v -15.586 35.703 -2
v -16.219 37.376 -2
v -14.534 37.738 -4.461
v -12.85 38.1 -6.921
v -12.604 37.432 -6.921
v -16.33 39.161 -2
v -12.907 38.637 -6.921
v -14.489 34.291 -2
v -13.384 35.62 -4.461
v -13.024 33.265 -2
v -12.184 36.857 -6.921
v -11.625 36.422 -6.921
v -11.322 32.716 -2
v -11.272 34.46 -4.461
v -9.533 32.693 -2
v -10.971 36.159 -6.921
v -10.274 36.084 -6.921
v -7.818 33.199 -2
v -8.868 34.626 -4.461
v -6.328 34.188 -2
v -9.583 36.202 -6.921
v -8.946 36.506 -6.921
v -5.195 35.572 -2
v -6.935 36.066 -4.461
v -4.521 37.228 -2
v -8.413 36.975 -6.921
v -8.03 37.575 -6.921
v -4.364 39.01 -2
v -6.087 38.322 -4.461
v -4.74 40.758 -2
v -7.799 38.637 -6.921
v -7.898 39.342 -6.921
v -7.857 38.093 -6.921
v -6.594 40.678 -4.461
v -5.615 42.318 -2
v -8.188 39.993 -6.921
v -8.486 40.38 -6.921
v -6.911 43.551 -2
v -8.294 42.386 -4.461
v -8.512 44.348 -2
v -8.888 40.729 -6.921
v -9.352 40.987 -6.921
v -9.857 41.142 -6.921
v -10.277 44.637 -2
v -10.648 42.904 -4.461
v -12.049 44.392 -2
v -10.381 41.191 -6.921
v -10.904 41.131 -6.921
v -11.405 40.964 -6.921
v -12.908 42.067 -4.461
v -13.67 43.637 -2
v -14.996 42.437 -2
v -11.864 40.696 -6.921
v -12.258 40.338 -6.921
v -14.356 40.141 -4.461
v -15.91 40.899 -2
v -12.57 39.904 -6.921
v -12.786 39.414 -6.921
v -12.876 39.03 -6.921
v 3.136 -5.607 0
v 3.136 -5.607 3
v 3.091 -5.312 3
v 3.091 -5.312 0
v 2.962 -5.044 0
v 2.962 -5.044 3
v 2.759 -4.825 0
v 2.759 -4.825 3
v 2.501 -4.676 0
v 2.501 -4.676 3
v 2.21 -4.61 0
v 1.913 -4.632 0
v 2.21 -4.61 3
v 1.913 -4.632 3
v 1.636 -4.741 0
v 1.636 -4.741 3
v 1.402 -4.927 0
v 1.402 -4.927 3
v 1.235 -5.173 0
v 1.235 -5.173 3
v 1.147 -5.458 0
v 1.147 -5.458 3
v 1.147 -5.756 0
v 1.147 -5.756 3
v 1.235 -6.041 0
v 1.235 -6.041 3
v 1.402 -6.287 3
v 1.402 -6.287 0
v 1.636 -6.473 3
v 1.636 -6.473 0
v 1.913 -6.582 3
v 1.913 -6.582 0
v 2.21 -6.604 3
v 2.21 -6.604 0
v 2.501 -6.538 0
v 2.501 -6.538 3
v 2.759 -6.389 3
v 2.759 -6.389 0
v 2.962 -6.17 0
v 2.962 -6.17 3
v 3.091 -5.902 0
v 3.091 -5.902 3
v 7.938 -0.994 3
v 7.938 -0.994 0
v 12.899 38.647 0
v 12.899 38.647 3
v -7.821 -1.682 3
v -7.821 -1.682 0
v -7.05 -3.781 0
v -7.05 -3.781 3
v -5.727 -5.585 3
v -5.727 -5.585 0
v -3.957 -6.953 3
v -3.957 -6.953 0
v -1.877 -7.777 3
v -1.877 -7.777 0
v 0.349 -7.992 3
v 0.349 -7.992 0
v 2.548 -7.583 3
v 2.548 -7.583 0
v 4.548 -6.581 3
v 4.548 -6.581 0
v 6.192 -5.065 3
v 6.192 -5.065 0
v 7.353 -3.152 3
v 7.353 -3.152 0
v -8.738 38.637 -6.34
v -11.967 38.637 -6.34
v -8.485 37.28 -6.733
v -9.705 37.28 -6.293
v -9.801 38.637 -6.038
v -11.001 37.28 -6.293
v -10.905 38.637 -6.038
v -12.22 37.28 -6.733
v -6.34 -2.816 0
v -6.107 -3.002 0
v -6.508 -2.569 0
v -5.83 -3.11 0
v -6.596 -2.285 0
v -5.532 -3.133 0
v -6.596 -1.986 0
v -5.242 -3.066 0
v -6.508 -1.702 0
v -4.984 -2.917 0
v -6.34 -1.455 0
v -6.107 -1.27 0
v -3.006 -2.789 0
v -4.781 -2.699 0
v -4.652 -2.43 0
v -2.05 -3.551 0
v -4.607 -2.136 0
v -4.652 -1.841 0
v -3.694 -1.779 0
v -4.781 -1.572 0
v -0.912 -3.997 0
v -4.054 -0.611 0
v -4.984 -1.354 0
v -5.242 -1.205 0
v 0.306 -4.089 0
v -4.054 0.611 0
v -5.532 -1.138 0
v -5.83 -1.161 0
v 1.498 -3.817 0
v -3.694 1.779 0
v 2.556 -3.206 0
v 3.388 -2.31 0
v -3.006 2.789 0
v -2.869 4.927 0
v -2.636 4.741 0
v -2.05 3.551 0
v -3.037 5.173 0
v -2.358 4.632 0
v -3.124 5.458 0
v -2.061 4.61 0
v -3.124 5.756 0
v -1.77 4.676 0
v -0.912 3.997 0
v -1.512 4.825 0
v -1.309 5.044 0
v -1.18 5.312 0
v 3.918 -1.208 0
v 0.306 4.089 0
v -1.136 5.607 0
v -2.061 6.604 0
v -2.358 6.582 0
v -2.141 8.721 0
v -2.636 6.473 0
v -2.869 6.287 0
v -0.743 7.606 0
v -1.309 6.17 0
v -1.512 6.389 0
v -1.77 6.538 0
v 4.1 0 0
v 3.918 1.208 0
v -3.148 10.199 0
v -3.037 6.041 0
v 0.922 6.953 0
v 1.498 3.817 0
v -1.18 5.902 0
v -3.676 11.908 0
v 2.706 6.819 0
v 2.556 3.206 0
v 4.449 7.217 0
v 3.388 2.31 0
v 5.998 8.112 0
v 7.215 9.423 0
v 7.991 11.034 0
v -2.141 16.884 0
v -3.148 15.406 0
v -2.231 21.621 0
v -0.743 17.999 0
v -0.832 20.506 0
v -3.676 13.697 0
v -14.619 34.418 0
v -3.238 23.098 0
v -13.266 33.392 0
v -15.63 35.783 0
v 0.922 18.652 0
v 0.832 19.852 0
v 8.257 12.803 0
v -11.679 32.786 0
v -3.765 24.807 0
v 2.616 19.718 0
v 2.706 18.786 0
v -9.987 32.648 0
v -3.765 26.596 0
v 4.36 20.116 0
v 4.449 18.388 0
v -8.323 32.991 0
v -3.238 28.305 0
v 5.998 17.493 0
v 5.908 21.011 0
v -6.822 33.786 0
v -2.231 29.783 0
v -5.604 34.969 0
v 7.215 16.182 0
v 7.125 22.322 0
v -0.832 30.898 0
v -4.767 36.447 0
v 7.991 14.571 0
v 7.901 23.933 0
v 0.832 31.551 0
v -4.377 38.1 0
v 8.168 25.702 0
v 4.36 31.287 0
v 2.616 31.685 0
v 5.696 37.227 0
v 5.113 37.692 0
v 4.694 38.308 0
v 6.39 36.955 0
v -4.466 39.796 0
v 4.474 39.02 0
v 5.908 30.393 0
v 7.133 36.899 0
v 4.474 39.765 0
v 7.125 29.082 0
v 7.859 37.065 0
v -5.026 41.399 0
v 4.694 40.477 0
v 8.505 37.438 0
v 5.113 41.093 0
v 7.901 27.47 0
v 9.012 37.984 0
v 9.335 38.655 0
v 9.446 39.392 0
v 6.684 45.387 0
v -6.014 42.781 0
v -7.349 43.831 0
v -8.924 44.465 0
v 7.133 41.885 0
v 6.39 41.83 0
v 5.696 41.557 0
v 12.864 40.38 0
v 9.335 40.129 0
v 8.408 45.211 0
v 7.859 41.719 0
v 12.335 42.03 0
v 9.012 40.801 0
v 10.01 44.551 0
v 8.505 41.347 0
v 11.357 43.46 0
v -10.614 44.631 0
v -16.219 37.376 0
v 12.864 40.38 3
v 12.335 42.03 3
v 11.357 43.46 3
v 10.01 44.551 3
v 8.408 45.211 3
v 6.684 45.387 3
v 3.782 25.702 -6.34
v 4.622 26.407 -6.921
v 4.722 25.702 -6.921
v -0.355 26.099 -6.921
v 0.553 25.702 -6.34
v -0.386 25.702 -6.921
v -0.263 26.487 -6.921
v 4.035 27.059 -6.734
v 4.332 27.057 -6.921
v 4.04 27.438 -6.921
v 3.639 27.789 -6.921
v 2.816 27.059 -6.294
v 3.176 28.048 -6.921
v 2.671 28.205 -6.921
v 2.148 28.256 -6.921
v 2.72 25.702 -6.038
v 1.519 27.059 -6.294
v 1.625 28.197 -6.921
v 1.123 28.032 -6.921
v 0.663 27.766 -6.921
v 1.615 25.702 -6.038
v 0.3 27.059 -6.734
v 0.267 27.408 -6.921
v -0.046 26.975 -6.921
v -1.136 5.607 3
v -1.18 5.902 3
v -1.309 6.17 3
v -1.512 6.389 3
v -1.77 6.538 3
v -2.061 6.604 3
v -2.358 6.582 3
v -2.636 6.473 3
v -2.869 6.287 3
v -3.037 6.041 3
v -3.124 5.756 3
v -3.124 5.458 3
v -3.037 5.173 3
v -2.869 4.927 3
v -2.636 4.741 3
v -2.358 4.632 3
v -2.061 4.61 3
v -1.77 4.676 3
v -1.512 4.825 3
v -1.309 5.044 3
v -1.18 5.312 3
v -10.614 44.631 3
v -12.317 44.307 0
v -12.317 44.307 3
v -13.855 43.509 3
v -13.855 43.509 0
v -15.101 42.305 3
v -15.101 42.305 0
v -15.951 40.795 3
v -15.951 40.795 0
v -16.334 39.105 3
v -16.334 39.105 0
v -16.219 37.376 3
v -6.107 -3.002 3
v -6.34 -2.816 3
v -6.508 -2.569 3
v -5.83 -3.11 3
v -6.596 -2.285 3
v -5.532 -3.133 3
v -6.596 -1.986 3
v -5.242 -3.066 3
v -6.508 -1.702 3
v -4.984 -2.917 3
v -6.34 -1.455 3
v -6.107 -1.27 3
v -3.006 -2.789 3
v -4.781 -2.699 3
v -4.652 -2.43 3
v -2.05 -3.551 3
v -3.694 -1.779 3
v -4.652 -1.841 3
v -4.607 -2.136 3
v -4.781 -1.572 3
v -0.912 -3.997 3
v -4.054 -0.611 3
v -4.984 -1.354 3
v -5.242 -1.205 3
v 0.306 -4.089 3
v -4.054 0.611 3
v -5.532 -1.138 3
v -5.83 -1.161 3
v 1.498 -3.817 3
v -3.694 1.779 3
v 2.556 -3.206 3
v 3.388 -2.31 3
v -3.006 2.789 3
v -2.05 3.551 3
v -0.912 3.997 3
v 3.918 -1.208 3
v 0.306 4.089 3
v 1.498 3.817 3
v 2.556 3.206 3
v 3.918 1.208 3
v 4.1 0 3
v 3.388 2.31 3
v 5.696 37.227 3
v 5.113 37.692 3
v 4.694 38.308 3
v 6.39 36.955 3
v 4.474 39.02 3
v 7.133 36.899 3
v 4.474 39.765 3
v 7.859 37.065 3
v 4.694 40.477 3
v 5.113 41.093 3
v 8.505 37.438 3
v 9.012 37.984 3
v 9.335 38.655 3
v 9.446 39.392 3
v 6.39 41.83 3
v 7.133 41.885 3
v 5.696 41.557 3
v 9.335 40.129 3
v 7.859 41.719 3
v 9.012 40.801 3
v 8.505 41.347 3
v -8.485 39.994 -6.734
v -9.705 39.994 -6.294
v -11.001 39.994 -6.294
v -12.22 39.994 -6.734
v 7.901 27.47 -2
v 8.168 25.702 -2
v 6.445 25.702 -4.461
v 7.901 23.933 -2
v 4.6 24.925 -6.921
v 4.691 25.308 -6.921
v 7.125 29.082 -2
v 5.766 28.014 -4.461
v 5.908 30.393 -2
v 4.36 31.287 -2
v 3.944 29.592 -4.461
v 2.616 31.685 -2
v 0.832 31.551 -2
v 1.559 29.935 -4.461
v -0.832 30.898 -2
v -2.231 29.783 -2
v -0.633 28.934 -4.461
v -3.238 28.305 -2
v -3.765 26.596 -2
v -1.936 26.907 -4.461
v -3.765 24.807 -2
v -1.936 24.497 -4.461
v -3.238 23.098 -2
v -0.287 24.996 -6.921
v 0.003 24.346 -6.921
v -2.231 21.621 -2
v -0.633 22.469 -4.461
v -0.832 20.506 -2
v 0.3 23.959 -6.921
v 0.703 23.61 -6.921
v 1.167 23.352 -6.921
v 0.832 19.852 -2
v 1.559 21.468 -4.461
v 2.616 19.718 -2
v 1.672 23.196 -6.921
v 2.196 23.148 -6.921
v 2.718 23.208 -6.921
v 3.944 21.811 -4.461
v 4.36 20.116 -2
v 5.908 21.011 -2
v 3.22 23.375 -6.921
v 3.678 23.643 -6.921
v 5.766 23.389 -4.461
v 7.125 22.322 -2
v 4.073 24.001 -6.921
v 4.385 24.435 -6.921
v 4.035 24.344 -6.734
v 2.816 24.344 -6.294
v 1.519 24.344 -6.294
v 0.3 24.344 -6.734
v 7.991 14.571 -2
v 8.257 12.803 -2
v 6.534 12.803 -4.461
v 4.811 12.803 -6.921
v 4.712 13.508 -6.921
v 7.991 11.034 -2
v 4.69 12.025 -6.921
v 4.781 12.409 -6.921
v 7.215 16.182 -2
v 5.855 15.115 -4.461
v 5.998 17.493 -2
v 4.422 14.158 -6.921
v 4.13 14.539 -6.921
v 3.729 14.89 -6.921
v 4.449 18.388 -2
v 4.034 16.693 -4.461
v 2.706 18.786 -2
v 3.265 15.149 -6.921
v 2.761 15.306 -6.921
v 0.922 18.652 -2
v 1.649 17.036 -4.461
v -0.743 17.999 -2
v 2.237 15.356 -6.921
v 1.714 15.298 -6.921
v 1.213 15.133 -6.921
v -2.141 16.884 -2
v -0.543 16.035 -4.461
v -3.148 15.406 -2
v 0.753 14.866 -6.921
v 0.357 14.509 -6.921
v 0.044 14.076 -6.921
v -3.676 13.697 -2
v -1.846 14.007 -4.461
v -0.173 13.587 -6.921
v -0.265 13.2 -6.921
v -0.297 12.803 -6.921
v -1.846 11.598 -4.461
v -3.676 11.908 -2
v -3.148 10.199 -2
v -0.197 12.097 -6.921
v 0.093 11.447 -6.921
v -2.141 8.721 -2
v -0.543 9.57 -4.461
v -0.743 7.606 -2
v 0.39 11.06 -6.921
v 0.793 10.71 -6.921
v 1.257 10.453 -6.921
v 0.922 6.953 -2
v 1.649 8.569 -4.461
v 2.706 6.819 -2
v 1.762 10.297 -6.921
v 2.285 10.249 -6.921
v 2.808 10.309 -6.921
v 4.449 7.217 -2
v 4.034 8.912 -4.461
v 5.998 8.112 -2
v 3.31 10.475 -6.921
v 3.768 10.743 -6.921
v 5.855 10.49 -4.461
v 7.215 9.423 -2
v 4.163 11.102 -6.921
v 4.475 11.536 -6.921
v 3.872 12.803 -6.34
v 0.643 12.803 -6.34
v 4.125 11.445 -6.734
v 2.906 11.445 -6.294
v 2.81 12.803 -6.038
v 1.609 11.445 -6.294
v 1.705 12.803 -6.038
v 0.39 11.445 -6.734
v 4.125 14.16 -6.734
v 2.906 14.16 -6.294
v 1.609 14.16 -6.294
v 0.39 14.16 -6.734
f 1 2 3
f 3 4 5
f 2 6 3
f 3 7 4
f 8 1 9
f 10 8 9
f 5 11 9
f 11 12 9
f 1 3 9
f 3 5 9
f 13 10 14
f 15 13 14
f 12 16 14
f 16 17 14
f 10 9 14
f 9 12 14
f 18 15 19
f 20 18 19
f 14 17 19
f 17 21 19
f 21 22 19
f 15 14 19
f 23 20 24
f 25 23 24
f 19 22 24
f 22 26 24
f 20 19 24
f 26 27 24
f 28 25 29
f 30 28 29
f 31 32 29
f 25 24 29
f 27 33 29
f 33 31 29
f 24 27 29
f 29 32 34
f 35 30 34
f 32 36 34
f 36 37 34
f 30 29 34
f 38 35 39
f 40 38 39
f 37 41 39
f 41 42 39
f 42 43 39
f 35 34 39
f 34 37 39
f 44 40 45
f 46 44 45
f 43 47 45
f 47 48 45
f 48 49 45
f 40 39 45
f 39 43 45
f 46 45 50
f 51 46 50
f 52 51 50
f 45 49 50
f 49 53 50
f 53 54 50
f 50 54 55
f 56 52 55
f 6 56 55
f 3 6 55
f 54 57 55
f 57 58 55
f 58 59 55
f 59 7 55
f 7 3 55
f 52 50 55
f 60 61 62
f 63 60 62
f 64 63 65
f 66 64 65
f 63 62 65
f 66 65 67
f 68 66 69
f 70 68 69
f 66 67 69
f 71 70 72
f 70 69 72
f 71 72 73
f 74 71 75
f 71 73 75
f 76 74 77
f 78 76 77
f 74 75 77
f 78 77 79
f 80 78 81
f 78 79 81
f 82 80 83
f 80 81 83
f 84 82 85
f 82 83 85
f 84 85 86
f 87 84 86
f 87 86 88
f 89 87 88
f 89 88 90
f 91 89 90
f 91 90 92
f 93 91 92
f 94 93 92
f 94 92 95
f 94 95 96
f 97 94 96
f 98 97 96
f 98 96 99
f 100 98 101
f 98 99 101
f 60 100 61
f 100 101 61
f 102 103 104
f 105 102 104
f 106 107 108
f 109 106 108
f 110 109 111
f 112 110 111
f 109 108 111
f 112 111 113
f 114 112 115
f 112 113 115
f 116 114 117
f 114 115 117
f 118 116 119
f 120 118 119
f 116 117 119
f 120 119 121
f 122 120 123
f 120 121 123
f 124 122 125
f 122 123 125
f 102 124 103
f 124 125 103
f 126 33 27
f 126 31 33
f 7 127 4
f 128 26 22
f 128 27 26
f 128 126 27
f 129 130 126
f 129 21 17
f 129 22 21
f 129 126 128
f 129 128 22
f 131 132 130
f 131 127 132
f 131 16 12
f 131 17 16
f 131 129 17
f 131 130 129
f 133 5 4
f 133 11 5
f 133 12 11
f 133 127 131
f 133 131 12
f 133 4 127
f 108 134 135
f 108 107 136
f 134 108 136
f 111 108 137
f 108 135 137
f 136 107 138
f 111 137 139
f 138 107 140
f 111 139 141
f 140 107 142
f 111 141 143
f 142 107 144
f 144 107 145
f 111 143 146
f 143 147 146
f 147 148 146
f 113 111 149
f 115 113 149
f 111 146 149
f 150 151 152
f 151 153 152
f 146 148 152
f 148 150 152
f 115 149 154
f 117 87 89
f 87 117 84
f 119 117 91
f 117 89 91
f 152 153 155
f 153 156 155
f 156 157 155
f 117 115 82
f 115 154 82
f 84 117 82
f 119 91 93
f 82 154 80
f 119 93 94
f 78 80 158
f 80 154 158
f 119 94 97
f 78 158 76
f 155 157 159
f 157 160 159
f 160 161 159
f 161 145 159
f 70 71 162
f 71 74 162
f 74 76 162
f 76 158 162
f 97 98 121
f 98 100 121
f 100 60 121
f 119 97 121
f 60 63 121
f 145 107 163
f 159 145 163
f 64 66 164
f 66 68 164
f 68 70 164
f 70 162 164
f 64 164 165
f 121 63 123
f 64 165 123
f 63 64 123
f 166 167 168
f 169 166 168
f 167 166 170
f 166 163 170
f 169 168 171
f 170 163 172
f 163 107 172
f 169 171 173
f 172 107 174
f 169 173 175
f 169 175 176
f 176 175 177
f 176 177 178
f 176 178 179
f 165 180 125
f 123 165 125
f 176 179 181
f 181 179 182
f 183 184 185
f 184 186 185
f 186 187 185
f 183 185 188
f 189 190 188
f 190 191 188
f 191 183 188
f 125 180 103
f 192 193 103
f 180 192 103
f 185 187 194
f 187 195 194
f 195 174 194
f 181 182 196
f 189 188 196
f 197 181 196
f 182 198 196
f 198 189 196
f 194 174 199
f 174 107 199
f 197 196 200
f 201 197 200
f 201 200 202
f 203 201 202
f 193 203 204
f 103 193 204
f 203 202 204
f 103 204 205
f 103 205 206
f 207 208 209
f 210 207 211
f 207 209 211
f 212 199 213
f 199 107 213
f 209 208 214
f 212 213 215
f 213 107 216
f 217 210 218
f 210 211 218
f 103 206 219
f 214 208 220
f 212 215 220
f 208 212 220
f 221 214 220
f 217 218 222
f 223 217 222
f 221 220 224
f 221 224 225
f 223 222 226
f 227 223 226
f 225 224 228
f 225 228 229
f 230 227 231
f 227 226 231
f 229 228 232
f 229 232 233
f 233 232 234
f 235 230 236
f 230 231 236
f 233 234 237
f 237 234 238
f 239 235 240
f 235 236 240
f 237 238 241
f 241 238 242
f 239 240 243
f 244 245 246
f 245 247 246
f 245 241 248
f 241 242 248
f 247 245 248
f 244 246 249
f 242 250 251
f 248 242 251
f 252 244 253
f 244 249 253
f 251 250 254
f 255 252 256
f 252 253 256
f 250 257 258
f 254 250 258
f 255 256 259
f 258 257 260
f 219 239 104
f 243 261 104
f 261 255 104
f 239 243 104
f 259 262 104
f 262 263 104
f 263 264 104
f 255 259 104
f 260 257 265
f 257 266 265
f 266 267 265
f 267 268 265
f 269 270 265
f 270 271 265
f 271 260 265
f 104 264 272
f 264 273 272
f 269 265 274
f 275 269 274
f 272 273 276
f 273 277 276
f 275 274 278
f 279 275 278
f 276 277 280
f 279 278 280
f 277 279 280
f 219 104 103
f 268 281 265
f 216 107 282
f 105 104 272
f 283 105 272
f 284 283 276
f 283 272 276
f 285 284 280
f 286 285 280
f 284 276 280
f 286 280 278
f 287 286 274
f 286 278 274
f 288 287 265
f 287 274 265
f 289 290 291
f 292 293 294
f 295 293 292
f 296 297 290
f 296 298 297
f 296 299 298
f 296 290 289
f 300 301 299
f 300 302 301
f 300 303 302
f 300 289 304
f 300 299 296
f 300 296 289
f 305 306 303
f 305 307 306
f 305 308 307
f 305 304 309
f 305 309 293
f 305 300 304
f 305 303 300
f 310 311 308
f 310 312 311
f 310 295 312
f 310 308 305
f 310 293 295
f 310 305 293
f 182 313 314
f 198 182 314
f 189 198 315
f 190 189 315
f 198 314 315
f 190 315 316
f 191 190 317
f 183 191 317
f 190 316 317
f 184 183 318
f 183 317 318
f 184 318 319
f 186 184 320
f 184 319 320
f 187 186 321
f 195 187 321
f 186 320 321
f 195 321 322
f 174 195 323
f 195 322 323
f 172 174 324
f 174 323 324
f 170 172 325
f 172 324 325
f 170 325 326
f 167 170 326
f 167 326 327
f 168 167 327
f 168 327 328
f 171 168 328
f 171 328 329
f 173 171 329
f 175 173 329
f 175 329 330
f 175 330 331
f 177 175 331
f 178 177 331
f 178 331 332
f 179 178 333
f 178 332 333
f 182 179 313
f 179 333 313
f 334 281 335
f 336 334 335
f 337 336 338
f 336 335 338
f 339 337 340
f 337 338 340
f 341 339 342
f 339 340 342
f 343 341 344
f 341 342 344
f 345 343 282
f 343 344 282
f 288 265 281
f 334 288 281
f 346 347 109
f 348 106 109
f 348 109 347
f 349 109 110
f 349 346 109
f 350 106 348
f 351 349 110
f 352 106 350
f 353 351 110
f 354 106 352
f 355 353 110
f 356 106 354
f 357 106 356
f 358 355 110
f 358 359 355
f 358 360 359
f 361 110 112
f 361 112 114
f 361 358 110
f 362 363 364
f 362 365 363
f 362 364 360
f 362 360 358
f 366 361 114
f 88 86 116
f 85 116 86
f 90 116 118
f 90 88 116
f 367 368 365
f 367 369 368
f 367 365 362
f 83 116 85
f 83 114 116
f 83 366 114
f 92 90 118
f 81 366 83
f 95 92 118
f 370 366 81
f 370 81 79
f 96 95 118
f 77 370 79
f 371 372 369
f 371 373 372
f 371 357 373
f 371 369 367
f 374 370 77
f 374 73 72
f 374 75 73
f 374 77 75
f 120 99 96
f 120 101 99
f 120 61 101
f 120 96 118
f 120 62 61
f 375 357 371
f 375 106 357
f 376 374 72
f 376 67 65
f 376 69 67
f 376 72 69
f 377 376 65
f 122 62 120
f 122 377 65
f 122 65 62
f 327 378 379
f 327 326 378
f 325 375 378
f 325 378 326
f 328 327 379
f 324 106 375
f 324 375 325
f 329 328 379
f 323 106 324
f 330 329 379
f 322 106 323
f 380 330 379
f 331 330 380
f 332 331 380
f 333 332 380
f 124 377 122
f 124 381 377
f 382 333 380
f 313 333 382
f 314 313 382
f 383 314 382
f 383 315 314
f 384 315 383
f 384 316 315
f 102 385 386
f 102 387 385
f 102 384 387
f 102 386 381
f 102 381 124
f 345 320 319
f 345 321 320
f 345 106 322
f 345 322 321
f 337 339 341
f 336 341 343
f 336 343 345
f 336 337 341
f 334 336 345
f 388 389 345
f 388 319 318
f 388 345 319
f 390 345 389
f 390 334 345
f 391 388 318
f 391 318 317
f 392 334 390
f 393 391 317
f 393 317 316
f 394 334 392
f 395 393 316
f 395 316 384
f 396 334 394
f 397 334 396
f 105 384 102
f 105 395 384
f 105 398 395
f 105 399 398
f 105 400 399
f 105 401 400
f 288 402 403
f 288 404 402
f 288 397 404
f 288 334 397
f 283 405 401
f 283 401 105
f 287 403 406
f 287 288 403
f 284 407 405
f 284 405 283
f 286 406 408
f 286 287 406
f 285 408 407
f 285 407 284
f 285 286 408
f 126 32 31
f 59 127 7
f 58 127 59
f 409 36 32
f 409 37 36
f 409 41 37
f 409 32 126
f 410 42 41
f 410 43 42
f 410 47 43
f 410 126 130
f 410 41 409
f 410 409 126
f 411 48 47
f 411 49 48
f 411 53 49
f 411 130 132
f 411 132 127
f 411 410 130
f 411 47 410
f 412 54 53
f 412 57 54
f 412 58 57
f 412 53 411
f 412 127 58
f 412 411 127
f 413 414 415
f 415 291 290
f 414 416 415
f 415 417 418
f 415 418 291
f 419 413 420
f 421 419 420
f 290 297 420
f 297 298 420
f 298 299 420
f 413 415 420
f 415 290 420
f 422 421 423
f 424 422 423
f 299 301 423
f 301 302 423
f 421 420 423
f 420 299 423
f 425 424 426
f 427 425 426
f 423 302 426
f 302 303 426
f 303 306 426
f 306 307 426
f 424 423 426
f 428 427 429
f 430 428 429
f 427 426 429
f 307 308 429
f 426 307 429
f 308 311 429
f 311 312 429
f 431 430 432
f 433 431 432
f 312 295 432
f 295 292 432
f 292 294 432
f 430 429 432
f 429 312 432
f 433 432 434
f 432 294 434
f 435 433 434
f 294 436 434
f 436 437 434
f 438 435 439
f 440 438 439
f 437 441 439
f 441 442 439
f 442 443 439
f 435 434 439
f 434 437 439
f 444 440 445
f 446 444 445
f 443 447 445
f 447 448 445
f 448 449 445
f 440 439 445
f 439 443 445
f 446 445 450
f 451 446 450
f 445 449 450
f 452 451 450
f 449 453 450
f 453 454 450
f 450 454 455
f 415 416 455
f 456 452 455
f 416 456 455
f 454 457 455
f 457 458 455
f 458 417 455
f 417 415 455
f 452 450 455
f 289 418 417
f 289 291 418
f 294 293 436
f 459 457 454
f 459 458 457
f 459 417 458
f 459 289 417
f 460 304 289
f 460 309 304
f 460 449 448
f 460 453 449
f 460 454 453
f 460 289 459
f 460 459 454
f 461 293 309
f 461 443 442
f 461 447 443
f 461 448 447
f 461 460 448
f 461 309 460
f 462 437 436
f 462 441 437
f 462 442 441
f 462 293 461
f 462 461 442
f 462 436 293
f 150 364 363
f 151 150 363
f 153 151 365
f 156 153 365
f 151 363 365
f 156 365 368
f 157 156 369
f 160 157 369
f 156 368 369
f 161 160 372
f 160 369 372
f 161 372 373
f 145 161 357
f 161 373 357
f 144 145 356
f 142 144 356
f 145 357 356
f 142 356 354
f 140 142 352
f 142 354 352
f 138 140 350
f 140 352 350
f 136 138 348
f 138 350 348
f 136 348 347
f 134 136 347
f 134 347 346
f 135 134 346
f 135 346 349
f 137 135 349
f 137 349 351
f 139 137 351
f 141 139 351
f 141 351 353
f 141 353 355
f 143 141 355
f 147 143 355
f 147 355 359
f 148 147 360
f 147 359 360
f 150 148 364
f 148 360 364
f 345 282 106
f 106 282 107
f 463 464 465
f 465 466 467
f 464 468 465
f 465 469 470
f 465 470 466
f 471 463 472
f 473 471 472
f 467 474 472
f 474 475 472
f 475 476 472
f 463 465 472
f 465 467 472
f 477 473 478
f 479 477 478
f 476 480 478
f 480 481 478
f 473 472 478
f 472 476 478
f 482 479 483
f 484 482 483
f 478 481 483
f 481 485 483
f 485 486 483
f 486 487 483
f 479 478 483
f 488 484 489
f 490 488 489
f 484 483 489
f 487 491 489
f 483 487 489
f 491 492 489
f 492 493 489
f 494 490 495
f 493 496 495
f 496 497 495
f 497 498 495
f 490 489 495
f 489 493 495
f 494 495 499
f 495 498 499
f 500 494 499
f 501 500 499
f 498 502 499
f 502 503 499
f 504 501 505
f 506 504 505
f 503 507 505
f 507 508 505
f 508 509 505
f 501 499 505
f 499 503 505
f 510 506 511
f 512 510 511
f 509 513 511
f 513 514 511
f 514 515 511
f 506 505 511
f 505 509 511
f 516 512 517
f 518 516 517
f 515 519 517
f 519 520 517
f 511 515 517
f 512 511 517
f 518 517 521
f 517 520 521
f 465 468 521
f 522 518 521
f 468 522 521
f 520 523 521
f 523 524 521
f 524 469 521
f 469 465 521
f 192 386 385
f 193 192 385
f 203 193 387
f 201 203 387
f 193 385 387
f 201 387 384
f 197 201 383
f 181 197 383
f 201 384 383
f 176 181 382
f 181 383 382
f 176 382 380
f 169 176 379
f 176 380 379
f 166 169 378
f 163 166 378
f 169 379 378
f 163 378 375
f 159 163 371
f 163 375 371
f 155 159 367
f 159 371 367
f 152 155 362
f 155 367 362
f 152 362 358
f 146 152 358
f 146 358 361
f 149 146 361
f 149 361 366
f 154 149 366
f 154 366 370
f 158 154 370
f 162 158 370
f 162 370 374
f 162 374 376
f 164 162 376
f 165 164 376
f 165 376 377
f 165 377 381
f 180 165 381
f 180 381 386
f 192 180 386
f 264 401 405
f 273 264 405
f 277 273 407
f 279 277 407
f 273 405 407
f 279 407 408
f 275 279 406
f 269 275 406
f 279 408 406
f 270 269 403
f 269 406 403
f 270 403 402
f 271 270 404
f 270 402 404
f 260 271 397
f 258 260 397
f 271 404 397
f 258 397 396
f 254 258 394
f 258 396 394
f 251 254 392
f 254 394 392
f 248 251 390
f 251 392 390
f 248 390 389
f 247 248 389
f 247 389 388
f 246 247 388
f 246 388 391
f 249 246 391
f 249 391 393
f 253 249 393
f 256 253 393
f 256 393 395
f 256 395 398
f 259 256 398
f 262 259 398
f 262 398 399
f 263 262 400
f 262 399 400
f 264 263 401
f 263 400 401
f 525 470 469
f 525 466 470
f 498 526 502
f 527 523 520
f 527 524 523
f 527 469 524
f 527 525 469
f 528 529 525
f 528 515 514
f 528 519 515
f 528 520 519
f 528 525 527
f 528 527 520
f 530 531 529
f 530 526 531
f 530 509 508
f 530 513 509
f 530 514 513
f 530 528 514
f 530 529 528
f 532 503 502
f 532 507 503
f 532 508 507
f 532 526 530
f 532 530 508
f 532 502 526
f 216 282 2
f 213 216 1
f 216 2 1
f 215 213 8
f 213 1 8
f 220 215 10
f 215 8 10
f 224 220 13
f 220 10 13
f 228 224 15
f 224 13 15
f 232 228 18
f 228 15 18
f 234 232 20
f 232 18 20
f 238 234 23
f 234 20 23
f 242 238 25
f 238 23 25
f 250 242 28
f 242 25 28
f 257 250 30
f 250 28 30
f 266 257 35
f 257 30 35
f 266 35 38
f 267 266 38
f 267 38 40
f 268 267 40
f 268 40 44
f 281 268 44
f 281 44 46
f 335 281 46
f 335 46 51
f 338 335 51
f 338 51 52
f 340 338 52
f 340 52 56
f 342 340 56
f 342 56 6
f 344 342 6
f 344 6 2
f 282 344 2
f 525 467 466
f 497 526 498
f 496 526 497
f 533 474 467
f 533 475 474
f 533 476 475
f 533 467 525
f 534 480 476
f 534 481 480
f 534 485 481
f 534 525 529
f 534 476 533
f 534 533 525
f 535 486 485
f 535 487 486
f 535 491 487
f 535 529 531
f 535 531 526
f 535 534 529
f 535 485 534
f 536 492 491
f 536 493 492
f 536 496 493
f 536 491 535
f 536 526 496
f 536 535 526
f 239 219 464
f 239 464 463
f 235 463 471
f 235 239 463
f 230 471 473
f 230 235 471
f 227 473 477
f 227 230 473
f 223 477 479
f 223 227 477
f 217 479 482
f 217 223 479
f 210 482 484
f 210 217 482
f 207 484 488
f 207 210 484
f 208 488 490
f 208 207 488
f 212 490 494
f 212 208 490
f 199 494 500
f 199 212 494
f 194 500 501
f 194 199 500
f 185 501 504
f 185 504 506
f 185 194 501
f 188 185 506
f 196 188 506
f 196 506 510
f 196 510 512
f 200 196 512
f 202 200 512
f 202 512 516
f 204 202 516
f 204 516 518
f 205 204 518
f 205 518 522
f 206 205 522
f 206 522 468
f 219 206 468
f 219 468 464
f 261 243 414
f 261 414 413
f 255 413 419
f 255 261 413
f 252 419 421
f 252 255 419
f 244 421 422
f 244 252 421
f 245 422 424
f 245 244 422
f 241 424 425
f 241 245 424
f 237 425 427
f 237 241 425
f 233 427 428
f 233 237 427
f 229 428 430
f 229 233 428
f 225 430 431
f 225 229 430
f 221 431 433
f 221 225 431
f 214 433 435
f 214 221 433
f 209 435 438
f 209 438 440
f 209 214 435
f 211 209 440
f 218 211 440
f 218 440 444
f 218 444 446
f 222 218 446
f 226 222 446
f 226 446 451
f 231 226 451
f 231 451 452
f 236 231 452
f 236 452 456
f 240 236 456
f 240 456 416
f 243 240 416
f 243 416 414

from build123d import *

# Parameters (mm, degrees)
BOSS_EXTRUDE1_DEPTH = 3
BOSS_EXTRUDE5_DEPTH = 3
SKETCH3_R           = 4.1
CUT_EXTRUDE1_DEPTH  = 50
BOSS_EXTRUDE2_START = -7
SKETCH1_3_R         = 6
BOSS_EXTRUDE2_DEPTH = 7
SKETCH1_4_R         = 6
BOSS_EXTRUDE3_DEPTH = 7
SKETCH1_5_R         = 6
BOSS_EXTRUDE6_DEPTH = 7
CHAMFER8_SIZE       = 5
CHAMFER8_SIZE_2     = 3.501037691
SKETCH9_R           = 1
CUT_EXTRUDE3_DEPTH  = 3
SKETCH13_R          = 2.5
CUT_EXTRUDE4_DEPTH  = 3


with BuildPart() as part:
    # Sketch1 → Boss-Extrude1 (new body)
    with BuildSketch(Plane.XY):
        with BuildLine():
            Line((8.47879639, 27.808299752), (-6.041521678, 42.809946731))
            ThreePointArc((-6.041521678, 42.809946731), (-13.178830457, 43.929795654), (-16.218713498, 37.375838886))
            Line((-16.218713498, 37.375838886), (-7.821268925, -1.68159222))
            ThreePointArc((-7.821268925, -1.68159222), (0.48240993, -7.985441795), (7.966824047, -0.727814955))
            Line((7.966824047, -0.727814955), (10.142674299, 23.089524856))
            ThreePointArc((10.142674299, 23.089524856), (9.826089659, 25.630630372), (8.47879639, 27.808299752))
        make_face()
    extrude(amount=BOSS_EXTRUDE1_DEPTH)

    # Sketch10 → Boss-Extrude5 (add)
    with BuildSketch(Plane.XY):
        with BuildLine():
            Line((-6.041521678, 42.809946731), (8.47879639, 27.808299752))
            ThreePointArc((8.47879639, 27.808299752), (9.826089659, 25.630630372), (10.142674299, 23.089524856))
            Line((10.142674299, 23.089524856), (7.966824047, -0.727814955))
            ThreePointArc((7.966824047, -0.727814955), (7.953555222, -0.86078995), (7.938067055, -0.993524752))
            Line((7.938067055, -0.993524752), (12.899477398, 38.647166557))
            ThreePointArc((12.899477398, 38.647166557), (11.356622336, 43.459959023), (6.684210782, 45.38659945))
            Line((6.684210782, 45.38659945), (-10.614478128, 44.631322381))
            ThreePointArc((-10.614478128, 44.631322381), (-8.13262373, 44.211168584), (-6.041521678, 42.809946731))
        make_face()
    extrude(amount=BOSS_EXTRUDE5_DEPTH)

    # Sketch3 → Cut-Extrude1 (cut)
    with BuildSketch(Plane.XY.offset(3)):
        Circle(SKETCH3_R)
    extrude(amount=-CUT_EXTRUDE1_DEPTH, mode=Mode.SUBTRACT)

    # Sketch1<3> → Boss-Extrude2 (add)
    with BuildSketch(Plane.XY.offset(BOSS_EXTRUDE2_START)):
        with Locations(Location((-10.352761804, 38.637033052, 0), (0, 0, 192.134016017))):
            Circle(SKETCH1_3_R)
    extrude(amount=BOSS_EXTRUDE2_DEPTH)

    # Sketch1<4> → Boss-Extrude3 (add)
    with BuildSketch(Plane.XY):
        with Locations((2.167556264, 25.701683368)):
            Circle(SKETCH1_4_R)
    extrude(amount=-BOSS_EXTRUDE3_DEPTH)

    # Sketch1<5> → Boss-Extrude6 (add)
    with BuildSketch(Plane.XY):
        with Locations((2.25742631, 12.802500789)):
            Circle(SKETCH1_5_R)
    extrude(amount=-BOSS_EXTRUDE6_DEPTH)

    # Sketch6 one side → Cut-Revolve1 (revolve, cut)
    with BuildSketch(Plane(origin=(-10.352761804, 0, 0), x_dir=(0, 0, -1), z_dir=(1, 0, 0))):
        with BuildLine():
            ThreePointArc((10, 34.637033052), (12.828427125, 35.808605927), (14, 38.637033052))
            ThreePointArc((14, 38.637033052), (12.828427125, 41.465460176), (10, 42.637033052))
            Line((10, 42.637033052), (10, 34.637033052))
        make_face()
    revolve(axis=Axis((-10.352761804, 42.637033052, -10), (0, -1, 0)), mode=Mode.SUBTRACT)

    # Sketch7 one side → Cut-Revolve2 (revolve, cut)
    with BuildSketch(Plane(origin=(2.167556264, 0, 0), x_dir=(0, 0, -1), z_dir=(1, 0, 0))):
        with BuildLine():
            ThreePointArc((10, 21.701683368), (12.828427125, 22.873256243), (14, 25.701683368))
            ThreePointArc((14, 25.701683368), (12.828427125, 28.530110493), (10, 29.701683368))
            Line((10, 29.701683368), (10, 21.701683368))
        make_face()
    revolve(axis=Axis((2.167556264, 29.701683368, -10), (0, -1, 0)), mode=Mode.SUBTRACT)

    # Sketch14 one side → Cut-Revolve3 (revolve, cut)
    with BuildSketch(Plane(origin=(2.25742631, 0, 0), x_dir=(0, 0, -1), z_dir=(1, 0, 0))):
        with BuildLine():
            ThreePointArc((10, 8.802500789), (12.828427125, 9.974073664), (14, 12.802500789))
            ThreePointArc((14, 12.802500789), (12.828427125, 15.630927914), (10, 16.802500789))
            Line((10, 16.802500789), (10, 8.802500789))
        make_face()
    revolve(axis=Axis((2.25742631, 16.802500789, -10), (0, -1, 0)), mode=Mode.SUBTRACT)

    # Chamfer8
    # the kernel refuses this chamfer: 5, 3.501037691 mm, written as the material it takes off along each edge
    with BuildSketch(Plane(origin=(-10.352761804, 38.637033052, -7), x_dir=(-0.9776586156884893, -0.21019902751931718, 0), z_dir=(-0.21019902751931718, 0.9776586156884893, 0))) as chamfer8_piece_1:
        Polygon((6, CHAMFER8_SIZE), (6 - CHAMFER8_SIZE_2, 0), (6, 0), align=None)
    revolve(axis=Axis((-10.352761804, 38.637033052, -7), (0, 0, 1)), mode=Mode.SUBTRACT)
    with BuildSketch(Plane(origin=(2.167556264, 25.701683368, -7), x_dir=(1, 0, 0), z_dir=(0, -1, 0))) as chamfer8_piece_2:
        Polygon((6, CHAMFER8_SIZE), (6 - CHAMFER8_SIZE_2, 0), (6, 0), align=None)
    revolve(axis=Axis((2.167556264, 25.701683368, -7), (0, 0, 1)), mode=Mode.SUBTRACT)
    with BuildSketch(Plane(origin=(2.25742631, 12.802500789, -7), x_dir=(1, 0, 0), z_dir=(0, -1, 0))) as chamfer8_piece_3:
        Polygon((6, CHAMFER8_SIZE), (6 - CHAMFER8_SIZE_2, 0), (6, 0), align=None)
    revolve(axis=Axis((2.25742631, 12.802500789, -7), (0, 0, 1)), mode=Mode.SUBTRACT)

    # Sketch9 → Cut-Extrude3 (cut)
    with BuildSketch(Plane.XY.offset(3)):
        with Locations((-2.135535698, 5.607092587)):
            Circle(SKETCH9_R)
        with Locations((2.135535698, -5.607092587)):
            Circle(SKETCH9_R)
        with Locations((-5.607092587, -2.135535698)):
            Circle(SKETCH9_R)
    extrude(amount=-CUT_EXTRUDE3_DEPTH, mode=Mode.SUBTRACT)

    # Sketch13 → Cut-Extrude4 (cut)
    with BuildSketch(Plane.XY.offset(3)):
        with Locations((6.945927107, 39.39231012)):
            Circle(SKETCH13_R)
    extrude(amount=-CUT_EXTRUDE4_DEPTH, mode=Mode.SUBTRACT)


solid = part.part
